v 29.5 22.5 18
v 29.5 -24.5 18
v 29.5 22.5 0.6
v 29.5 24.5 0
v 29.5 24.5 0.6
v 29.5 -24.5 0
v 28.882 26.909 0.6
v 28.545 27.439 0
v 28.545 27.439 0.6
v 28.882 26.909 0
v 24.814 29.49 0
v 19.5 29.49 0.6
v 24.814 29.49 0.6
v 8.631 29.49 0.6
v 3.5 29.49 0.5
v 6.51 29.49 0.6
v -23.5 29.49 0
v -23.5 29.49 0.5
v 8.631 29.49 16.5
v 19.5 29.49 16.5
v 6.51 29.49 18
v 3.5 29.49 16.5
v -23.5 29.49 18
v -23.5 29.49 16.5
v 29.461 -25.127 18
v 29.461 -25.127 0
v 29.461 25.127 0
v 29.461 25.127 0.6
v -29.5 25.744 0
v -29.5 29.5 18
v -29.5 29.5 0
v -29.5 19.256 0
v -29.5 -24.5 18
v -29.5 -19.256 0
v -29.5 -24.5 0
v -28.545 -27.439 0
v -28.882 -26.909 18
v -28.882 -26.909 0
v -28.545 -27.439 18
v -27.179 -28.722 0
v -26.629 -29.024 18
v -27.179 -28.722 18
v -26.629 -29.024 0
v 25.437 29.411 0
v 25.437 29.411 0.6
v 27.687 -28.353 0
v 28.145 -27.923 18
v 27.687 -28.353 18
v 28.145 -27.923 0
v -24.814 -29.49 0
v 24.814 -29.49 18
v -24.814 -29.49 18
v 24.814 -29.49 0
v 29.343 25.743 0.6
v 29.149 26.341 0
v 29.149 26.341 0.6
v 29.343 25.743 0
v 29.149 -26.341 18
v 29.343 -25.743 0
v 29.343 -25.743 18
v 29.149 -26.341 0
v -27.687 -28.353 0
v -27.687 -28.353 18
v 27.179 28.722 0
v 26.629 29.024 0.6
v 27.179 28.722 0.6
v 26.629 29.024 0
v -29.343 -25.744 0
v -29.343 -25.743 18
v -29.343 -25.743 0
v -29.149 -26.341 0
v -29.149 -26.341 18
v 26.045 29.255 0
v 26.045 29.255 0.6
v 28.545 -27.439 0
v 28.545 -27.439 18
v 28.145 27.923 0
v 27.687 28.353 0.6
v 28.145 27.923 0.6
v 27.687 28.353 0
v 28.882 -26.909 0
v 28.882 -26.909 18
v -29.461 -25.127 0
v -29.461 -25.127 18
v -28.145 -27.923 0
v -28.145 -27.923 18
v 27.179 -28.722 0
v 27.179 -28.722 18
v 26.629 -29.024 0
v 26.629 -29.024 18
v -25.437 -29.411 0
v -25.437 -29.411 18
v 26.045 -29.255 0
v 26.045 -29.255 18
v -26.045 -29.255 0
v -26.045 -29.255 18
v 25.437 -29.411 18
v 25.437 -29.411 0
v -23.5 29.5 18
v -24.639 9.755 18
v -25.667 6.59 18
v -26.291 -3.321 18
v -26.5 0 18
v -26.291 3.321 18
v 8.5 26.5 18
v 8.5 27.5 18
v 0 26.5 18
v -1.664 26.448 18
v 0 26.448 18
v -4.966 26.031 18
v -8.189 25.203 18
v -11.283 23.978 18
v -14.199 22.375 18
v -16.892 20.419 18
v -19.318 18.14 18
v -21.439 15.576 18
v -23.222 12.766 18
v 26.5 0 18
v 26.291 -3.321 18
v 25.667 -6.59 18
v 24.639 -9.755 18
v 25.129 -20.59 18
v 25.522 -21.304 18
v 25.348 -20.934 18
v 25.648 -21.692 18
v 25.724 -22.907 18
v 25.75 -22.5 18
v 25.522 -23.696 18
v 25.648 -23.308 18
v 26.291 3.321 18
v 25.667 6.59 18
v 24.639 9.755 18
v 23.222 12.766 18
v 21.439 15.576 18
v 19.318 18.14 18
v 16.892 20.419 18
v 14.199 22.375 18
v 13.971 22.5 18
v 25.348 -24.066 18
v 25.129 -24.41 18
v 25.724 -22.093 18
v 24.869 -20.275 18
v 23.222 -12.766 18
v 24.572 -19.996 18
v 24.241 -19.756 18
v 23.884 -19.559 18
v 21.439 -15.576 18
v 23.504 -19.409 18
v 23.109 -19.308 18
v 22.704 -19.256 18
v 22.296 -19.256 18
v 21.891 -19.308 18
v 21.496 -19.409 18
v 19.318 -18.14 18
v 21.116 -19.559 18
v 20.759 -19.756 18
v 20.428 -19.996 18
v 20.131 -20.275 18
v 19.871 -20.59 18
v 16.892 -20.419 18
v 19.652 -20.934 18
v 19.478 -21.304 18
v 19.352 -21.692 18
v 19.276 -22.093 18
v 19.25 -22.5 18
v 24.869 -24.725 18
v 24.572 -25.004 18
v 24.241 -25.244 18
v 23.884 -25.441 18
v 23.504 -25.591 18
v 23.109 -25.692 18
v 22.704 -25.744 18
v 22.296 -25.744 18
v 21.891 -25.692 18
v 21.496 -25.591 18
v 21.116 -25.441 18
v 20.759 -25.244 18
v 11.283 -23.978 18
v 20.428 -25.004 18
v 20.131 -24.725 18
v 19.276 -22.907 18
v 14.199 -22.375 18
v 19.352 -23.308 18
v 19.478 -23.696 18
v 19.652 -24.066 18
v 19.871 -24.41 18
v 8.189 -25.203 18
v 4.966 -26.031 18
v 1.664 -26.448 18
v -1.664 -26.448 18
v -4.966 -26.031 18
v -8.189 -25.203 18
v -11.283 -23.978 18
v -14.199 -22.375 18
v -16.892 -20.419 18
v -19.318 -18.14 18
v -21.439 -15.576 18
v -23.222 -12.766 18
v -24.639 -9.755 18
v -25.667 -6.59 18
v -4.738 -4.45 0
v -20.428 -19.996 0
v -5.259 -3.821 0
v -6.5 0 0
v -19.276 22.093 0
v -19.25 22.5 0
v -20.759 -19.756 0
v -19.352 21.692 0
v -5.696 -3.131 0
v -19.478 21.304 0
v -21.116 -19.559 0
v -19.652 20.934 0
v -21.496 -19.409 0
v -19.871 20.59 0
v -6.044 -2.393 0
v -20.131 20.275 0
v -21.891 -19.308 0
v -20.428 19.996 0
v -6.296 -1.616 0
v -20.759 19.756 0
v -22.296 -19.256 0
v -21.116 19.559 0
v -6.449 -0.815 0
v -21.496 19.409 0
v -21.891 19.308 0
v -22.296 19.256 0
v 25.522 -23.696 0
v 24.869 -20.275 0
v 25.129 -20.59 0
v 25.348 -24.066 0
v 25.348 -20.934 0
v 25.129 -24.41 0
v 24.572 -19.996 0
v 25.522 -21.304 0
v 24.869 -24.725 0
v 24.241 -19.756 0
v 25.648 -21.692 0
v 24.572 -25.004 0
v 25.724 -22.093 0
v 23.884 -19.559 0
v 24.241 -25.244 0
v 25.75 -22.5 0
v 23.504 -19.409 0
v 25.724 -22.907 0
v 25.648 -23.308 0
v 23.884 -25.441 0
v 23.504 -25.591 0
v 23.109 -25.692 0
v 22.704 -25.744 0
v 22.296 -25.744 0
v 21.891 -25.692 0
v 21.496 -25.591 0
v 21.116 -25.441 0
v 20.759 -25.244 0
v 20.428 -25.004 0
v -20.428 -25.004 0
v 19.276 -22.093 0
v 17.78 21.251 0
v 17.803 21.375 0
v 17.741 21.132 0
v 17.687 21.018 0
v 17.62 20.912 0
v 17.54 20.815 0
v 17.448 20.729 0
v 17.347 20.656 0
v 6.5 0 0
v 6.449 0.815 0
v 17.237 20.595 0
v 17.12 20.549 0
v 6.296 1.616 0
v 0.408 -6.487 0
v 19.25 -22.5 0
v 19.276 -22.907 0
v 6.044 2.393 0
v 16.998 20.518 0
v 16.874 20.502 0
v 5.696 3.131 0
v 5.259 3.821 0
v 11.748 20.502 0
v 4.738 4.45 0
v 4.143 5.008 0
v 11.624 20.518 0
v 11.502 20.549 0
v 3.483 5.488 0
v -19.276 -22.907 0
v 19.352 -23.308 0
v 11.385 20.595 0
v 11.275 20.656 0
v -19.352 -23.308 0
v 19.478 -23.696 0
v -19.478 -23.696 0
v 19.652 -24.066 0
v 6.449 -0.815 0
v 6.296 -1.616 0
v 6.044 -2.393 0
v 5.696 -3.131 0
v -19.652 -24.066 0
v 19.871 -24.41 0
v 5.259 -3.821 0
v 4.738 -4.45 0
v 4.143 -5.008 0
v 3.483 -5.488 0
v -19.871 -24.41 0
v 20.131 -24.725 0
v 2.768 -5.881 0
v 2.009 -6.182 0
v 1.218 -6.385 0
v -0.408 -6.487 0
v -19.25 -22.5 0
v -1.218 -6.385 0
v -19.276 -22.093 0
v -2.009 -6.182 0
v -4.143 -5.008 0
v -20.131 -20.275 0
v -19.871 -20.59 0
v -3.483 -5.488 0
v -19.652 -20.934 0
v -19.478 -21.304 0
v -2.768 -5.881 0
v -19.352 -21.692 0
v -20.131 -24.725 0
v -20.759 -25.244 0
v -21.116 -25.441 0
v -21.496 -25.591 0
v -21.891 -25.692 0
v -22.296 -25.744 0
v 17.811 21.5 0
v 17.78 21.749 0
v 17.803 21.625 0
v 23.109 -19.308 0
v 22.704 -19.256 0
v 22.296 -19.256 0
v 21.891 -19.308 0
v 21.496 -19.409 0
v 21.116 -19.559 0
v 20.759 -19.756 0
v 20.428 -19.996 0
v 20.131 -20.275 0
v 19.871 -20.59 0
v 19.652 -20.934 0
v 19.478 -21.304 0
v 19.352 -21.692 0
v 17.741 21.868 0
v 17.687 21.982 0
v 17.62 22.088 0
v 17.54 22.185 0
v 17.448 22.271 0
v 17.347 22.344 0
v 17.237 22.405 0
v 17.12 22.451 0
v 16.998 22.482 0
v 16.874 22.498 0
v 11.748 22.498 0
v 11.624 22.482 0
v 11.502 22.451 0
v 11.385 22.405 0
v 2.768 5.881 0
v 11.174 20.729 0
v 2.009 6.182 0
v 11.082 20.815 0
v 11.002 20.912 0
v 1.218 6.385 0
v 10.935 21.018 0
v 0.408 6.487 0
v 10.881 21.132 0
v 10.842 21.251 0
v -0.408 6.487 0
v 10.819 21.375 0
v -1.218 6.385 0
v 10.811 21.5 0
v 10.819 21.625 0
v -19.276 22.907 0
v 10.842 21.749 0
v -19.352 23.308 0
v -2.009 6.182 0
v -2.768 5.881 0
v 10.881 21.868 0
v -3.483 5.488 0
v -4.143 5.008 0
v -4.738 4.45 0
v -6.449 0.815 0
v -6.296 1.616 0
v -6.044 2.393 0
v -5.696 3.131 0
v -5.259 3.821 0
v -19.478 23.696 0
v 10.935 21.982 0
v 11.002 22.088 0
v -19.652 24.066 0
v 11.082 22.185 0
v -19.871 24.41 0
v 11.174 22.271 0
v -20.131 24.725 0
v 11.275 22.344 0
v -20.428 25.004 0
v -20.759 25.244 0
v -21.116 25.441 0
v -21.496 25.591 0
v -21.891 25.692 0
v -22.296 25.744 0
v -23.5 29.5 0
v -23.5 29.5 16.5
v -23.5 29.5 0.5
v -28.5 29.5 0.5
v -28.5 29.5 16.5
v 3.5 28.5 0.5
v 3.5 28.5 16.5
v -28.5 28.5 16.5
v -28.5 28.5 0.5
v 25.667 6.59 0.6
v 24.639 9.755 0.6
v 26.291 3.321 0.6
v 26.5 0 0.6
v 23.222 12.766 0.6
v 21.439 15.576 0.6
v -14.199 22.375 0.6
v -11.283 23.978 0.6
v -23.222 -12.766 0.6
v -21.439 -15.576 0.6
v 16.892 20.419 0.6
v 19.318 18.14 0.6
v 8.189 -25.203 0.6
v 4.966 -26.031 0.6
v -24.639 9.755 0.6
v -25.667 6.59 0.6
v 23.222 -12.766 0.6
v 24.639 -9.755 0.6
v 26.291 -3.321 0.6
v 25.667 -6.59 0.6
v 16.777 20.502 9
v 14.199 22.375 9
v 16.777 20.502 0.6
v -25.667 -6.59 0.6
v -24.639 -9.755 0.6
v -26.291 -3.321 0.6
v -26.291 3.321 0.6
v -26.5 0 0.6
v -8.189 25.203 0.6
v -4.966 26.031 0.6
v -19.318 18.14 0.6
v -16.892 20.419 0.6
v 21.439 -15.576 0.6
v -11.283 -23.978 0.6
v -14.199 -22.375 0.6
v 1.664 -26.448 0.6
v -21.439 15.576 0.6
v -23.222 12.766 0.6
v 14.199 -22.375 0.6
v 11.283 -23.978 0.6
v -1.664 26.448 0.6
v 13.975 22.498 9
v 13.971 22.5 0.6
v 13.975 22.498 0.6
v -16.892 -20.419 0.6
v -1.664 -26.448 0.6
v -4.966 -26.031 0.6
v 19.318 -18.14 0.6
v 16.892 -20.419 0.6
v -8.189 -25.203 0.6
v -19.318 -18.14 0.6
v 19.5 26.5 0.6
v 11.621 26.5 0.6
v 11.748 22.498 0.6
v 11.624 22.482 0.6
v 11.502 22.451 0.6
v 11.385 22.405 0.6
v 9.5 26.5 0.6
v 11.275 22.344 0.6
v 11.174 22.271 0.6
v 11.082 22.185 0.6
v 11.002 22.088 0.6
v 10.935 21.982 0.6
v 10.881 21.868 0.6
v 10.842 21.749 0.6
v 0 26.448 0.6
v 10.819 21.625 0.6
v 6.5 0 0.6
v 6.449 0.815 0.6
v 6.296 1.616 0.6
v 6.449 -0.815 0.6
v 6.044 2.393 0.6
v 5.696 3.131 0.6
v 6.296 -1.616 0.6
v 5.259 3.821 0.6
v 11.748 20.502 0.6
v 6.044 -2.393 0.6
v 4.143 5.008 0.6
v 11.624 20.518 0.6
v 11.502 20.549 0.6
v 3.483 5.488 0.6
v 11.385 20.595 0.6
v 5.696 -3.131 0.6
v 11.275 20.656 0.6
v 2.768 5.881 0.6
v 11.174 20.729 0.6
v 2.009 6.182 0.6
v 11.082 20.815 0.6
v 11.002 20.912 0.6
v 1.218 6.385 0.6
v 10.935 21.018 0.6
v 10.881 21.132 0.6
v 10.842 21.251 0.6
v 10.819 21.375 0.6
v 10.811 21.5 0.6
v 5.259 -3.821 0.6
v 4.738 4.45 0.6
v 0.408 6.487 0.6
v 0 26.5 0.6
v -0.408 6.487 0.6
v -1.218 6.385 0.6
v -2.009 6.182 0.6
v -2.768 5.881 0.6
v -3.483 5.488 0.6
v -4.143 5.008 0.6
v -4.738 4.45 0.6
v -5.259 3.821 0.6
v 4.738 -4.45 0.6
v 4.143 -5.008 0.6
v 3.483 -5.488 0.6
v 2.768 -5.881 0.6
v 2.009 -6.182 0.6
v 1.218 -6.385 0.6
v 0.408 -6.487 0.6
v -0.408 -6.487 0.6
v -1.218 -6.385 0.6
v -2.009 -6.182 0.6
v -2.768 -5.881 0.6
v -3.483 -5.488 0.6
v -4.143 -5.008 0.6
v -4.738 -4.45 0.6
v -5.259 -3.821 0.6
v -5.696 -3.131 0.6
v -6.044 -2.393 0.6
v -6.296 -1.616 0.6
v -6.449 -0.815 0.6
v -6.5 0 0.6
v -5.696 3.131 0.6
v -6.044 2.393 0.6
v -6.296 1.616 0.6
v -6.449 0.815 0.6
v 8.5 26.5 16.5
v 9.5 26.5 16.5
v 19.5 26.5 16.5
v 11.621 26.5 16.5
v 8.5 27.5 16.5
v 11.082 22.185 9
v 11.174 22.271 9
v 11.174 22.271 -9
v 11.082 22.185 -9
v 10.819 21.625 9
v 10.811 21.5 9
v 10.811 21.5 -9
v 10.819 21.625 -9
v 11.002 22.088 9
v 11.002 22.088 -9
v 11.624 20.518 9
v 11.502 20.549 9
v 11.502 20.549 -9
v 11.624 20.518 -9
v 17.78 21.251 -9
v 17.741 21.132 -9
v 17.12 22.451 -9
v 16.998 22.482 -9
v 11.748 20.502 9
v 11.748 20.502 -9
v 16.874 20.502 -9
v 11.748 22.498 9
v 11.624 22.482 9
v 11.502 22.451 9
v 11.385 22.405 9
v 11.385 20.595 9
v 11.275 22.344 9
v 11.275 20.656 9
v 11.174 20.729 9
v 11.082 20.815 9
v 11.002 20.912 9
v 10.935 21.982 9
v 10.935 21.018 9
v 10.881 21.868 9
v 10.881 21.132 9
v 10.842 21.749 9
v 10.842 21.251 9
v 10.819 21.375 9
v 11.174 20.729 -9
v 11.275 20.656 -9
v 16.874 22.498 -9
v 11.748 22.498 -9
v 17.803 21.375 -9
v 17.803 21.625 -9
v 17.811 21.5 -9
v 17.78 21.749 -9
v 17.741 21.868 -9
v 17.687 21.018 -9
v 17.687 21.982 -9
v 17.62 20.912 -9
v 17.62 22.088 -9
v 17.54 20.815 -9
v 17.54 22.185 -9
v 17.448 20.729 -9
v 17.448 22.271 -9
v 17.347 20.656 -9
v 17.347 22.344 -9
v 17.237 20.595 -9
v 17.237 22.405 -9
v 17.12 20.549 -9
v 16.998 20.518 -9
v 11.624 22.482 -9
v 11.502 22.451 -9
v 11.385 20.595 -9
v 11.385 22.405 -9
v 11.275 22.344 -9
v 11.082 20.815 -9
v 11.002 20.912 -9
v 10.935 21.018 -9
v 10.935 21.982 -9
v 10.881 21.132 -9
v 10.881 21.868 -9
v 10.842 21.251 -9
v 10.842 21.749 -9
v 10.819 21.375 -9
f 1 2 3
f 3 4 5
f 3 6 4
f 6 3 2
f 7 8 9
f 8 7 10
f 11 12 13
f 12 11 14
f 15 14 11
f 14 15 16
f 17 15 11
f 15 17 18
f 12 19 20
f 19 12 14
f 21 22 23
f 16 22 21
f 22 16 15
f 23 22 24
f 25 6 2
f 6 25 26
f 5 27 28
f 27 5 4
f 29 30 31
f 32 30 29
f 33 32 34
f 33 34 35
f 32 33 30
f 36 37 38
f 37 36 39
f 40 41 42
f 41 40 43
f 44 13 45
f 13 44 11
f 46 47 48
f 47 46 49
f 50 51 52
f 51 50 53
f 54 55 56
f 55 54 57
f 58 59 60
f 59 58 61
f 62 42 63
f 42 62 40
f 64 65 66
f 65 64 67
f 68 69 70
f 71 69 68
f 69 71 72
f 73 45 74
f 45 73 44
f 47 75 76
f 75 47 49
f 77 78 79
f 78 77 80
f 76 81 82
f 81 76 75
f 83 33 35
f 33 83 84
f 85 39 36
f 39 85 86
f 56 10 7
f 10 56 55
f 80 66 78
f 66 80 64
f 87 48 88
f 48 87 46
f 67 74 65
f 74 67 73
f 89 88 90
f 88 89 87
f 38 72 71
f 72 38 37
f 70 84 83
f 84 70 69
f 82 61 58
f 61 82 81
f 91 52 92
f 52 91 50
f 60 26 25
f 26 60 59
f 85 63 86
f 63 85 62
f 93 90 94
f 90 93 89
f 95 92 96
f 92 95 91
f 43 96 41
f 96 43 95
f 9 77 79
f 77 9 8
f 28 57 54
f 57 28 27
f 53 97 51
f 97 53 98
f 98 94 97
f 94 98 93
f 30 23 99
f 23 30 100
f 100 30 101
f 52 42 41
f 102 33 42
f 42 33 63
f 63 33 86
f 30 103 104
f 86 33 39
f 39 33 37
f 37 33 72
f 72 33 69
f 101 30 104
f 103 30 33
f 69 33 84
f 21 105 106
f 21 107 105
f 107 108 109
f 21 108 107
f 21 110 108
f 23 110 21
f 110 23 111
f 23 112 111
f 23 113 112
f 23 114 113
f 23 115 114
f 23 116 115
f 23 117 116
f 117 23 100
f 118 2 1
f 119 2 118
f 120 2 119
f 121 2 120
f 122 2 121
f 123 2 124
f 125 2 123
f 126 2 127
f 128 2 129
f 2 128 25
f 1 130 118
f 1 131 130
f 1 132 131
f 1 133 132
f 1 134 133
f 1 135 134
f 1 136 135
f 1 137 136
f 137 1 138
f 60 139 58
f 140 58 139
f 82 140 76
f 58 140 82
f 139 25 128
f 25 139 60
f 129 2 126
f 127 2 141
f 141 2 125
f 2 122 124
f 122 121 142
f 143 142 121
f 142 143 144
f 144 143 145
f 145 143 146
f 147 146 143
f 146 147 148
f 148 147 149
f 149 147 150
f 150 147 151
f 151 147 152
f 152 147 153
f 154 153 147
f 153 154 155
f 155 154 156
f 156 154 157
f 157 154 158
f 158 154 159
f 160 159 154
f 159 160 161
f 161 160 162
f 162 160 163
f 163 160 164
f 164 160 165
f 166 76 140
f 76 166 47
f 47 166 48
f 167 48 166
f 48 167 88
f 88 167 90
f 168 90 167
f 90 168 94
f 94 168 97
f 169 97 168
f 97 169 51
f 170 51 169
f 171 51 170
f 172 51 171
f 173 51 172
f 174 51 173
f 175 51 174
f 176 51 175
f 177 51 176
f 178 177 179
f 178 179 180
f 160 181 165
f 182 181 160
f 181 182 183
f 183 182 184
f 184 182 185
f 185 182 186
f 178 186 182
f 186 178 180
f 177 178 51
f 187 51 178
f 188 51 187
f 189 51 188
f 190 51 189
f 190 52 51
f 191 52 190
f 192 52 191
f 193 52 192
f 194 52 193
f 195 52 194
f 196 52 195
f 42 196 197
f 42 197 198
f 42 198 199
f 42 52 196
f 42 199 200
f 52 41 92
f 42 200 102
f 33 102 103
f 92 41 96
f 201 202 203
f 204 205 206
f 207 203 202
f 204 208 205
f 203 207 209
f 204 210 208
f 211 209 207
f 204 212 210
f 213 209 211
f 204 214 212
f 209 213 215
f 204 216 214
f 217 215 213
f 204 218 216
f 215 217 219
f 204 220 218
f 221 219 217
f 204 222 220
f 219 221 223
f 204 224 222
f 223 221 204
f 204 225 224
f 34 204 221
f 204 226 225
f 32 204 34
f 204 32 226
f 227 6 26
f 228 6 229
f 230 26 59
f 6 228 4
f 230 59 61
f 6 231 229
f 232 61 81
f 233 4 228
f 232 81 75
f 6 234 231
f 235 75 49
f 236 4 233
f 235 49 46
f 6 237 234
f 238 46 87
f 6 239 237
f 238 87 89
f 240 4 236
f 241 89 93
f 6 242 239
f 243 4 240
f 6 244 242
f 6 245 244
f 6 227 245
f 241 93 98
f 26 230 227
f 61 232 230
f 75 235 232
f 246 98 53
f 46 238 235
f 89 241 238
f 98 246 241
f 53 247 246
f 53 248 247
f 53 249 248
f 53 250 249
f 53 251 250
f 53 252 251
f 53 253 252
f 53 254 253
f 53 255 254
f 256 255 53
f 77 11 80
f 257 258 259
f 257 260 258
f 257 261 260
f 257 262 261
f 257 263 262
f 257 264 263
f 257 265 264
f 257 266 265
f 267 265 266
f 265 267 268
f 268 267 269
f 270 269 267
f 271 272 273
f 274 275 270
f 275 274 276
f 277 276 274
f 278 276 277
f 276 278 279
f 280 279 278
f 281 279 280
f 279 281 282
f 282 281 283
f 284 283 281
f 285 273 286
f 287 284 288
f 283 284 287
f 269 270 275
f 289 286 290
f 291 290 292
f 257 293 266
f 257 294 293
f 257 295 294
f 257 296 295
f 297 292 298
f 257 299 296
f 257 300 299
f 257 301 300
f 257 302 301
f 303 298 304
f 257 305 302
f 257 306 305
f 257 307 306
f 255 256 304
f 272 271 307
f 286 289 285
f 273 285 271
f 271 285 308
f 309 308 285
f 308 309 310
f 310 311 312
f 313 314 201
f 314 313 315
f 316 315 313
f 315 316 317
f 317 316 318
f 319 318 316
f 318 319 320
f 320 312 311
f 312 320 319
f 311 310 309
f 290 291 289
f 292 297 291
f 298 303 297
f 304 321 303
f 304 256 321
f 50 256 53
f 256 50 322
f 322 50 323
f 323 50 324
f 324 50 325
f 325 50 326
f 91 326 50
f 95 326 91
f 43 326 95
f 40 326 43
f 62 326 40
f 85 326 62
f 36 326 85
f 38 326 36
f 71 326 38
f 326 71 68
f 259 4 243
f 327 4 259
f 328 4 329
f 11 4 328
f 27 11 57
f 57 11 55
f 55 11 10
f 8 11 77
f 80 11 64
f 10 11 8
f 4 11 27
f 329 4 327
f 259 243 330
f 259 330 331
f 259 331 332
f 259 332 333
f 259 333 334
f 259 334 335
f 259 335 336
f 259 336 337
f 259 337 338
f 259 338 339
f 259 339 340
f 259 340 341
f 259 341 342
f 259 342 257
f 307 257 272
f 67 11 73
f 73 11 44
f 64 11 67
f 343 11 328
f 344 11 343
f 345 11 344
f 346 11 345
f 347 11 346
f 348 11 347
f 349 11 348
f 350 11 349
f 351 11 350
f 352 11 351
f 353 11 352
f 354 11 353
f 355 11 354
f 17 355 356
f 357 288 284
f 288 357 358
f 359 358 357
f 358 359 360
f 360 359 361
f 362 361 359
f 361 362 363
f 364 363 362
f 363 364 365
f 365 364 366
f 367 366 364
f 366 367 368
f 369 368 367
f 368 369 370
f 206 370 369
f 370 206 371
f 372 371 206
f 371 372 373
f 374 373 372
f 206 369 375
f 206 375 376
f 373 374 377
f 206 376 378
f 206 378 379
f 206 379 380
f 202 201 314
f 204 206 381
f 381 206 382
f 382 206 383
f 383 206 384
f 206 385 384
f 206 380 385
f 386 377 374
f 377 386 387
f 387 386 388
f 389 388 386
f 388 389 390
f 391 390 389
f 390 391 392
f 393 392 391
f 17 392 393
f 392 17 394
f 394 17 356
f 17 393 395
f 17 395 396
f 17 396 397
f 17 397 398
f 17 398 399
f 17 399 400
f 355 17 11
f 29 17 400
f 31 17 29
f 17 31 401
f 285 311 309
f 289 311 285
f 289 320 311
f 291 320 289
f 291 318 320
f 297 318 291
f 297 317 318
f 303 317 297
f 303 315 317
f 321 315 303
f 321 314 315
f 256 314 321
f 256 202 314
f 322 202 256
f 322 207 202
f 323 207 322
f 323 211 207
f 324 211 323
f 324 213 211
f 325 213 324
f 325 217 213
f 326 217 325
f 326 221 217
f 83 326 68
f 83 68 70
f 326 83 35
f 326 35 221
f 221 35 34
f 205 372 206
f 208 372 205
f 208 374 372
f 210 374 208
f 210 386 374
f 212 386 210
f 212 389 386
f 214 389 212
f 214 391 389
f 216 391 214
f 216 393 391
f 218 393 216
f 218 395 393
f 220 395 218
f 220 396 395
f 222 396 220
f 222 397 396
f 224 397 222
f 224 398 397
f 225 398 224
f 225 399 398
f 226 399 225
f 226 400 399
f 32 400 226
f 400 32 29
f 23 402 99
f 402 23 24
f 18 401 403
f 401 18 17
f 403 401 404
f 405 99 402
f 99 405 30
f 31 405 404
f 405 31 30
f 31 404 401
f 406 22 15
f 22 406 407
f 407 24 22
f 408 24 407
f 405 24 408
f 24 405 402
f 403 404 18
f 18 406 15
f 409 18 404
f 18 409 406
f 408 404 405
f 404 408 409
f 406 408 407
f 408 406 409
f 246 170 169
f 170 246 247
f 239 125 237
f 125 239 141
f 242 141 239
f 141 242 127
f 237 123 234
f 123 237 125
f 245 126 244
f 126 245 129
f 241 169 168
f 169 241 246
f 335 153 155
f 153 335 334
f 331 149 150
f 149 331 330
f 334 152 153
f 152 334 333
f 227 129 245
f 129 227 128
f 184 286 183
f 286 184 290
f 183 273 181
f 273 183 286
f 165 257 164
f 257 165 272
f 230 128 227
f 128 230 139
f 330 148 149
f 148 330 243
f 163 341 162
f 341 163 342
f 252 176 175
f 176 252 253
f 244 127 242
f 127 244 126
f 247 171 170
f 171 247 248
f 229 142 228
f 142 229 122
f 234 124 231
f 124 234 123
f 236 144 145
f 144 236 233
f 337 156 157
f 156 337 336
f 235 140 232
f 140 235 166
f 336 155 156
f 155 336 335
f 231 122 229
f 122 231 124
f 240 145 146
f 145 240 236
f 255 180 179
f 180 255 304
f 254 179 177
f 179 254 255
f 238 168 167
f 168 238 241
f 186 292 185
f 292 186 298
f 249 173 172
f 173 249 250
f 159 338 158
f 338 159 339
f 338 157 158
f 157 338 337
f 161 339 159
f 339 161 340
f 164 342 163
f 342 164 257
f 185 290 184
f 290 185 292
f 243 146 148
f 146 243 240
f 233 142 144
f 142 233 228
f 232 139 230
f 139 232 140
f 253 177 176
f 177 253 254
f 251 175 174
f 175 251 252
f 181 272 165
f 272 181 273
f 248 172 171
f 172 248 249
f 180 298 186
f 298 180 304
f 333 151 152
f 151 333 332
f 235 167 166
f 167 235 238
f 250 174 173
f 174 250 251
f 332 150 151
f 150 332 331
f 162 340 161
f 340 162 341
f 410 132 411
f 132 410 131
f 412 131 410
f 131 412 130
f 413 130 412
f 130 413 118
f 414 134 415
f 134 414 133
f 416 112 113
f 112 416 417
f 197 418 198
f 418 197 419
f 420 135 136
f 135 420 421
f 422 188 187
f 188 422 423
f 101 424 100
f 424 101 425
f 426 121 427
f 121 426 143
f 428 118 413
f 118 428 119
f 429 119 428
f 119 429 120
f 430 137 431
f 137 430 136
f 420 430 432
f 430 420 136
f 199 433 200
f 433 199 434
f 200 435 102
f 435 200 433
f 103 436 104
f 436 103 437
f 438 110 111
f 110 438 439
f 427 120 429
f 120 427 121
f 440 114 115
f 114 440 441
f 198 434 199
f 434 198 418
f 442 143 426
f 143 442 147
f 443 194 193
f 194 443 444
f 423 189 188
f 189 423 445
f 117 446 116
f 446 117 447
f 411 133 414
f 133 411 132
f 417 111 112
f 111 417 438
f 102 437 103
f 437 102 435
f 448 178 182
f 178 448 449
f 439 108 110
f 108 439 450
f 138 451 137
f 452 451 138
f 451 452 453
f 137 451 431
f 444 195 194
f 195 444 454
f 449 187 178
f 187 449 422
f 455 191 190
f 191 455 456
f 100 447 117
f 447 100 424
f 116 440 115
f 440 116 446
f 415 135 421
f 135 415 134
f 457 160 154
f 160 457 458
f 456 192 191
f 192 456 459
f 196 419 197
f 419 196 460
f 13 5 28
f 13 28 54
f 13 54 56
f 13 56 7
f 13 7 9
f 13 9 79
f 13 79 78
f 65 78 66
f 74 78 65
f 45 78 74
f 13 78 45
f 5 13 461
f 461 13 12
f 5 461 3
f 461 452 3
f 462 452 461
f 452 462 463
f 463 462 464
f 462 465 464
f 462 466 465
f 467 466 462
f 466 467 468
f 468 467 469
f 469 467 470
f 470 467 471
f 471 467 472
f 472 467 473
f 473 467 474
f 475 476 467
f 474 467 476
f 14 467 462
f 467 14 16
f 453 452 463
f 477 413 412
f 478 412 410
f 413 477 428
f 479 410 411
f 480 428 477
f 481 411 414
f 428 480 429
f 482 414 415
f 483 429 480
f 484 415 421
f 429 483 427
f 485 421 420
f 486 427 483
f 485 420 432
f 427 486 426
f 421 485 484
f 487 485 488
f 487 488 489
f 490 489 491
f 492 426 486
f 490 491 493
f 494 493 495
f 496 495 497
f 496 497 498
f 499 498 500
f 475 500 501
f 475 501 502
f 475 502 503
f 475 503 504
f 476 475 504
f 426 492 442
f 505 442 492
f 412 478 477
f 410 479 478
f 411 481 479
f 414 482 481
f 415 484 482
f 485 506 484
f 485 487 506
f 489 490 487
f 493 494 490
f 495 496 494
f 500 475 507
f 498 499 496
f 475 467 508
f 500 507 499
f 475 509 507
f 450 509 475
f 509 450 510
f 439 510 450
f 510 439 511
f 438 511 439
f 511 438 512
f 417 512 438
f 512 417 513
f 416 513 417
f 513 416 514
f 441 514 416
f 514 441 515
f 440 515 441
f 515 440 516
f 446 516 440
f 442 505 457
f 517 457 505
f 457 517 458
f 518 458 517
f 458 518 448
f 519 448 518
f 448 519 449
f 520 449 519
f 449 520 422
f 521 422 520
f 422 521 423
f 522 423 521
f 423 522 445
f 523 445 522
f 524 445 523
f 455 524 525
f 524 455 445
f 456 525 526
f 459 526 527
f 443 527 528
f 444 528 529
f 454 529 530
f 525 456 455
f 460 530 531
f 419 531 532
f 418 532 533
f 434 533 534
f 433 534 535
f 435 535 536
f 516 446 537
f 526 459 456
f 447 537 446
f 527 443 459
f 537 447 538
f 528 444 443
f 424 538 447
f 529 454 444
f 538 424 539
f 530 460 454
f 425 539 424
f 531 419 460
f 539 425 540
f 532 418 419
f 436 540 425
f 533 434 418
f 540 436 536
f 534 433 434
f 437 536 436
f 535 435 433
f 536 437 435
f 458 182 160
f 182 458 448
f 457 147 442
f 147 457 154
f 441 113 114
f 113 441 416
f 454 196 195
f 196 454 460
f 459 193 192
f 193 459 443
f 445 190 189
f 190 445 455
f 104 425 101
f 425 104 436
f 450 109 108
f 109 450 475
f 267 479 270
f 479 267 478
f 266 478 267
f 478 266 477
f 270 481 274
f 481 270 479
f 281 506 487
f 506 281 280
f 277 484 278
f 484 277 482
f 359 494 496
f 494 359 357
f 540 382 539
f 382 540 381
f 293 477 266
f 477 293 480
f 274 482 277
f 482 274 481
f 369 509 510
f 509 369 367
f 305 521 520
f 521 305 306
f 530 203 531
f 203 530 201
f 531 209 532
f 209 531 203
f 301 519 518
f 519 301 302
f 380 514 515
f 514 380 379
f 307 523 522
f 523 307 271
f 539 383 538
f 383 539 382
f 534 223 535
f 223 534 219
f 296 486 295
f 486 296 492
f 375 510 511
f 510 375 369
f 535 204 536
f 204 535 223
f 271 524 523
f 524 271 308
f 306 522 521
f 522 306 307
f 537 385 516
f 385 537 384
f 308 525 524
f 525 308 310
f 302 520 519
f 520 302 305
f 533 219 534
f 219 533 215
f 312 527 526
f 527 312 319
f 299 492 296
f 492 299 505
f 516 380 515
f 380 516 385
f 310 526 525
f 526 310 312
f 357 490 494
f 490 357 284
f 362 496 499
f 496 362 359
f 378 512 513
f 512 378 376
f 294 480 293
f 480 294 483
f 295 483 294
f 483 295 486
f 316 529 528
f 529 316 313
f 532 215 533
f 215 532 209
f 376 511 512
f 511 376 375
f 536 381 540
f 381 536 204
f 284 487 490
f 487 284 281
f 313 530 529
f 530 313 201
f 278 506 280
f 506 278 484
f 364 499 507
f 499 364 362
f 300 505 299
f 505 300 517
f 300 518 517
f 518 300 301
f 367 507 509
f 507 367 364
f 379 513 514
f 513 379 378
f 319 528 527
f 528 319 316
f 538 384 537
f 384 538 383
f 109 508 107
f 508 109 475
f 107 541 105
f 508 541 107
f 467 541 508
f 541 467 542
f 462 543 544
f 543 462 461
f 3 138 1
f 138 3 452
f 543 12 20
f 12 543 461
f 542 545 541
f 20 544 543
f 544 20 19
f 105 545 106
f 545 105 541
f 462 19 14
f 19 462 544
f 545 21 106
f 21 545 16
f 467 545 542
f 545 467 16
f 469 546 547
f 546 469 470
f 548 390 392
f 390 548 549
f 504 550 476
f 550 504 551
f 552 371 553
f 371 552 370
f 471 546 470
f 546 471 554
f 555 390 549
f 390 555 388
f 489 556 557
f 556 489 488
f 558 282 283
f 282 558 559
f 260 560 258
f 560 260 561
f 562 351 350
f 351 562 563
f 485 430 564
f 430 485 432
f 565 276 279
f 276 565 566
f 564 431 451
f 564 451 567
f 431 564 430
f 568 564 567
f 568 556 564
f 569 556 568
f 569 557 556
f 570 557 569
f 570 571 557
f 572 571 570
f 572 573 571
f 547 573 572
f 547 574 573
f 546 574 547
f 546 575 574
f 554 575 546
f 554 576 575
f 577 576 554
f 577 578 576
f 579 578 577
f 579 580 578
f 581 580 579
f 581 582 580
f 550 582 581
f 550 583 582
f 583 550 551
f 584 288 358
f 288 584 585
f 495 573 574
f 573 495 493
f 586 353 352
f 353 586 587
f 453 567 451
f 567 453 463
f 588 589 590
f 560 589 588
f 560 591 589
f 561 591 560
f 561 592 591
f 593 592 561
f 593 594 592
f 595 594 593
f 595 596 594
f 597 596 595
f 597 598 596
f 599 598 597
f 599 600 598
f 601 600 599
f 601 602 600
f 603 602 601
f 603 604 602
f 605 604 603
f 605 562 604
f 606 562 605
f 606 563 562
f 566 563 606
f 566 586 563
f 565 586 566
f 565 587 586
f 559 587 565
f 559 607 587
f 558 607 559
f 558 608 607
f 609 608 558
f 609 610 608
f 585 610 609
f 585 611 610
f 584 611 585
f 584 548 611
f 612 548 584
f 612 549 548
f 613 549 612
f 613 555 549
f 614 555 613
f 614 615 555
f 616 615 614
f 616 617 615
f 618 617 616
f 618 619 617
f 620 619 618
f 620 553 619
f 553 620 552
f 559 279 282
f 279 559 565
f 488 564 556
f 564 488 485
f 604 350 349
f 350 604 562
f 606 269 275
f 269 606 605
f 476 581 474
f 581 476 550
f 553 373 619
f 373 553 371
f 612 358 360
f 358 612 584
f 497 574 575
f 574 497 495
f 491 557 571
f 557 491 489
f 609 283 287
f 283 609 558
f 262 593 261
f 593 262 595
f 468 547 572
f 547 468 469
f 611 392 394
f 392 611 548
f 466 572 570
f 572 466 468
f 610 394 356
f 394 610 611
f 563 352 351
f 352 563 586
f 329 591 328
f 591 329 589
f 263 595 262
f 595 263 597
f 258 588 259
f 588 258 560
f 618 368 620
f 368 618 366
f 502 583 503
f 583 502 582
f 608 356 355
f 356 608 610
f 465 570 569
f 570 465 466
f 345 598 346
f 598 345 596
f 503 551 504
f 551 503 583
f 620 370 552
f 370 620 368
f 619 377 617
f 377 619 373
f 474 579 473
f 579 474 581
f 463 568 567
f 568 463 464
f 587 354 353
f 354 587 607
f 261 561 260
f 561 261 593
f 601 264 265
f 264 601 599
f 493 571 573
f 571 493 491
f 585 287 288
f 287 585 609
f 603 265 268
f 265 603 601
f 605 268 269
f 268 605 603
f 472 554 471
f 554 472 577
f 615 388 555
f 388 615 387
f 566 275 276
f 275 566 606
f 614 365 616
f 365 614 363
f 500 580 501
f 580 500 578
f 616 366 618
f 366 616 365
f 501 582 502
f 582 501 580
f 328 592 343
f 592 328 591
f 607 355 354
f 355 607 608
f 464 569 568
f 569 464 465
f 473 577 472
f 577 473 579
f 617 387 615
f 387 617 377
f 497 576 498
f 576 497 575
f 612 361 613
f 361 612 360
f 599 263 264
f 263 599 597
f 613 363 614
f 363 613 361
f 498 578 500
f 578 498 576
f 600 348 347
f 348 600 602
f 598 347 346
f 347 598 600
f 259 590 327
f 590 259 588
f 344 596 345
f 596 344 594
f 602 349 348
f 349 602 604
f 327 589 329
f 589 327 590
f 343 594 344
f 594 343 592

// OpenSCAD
$fn = 50;


union() {
	difference() {
		union() {
			hull() {
				translate(v = [-24.5000000000, 24.5000000000, 0]) {
					cylinder(h = 18, r = 5);
				}
				translate(v = [24.5000000000, 24.5000000000, 0]) {
					cylinder(h = 18, r = 5);
				}
				translate(v = [-24.5000000000, -24.5000000000, 0]) {
					cylinder(h = 18, r = 5);
				}
				translate(v = [24.5000000000, -24.5000000000, 0]) {
					cylinder(h = 18, r = 5);
				}
			}
			translate(v = [-29.5000000000, 23.5000000000, 0]) {
				cube(size = [6, 6, 18]);
			}
		}
		union() {
			translate(v = [-30.0000000000, -22.5000000000, -250.0000000000]) {
				rotate(a = [0, 0, 0]) {
					difference() {
						union() {
							hull() {
								translate(v = [7.5000000000, 0, 0]) {
									cylinder(h = 250, r = 3.2500000000, r1 = 3.2500000000, r2 = 3.2500000000);
								}
								translate(v = [-7.5000000000, 0, 0]) {
									cylinder(h = 250, r = 3.2500000000, r1 = 3.2500000000, r2 = 3.2500000000);
								}
							}
						}
						union();
					}
				}
			}
			translate(v = [-30.0000000000, 22.5000000000, -250.0000000000]) {
				rotate(a = [0, 0, 0]) {
					difference() {
						union() {
							hull() {
								translate(v = [7.5000000000, 0, 0]) {
									cylinder(h = 250, r = 3.2500000000, r1 = 3.2500000000, r2 = 3.2500000000);
								}
								translate(v = [-7.5000000000, 0, 0]) {
									cylinder(h = 250, r = 3.2500000000, r1 = 3.2500000000, r2 = 3.2500000000);
								}
							}
						}
						union();
					}
				}
			}
			translate(v = [-28.5000000000, 28.5000000000, 0.5000000000]) {
				cube(size = [32, 1, 16]);
			}
			translate(v = [22.5000000000, -22.5000000000, 0]) {
				cylinder(h = 100, r = 3.2500000000);
			}
			translate(v = [0, 0, 0.6000000000]) {
				cylinder(h = 20.4000000000, r = 26.5000000000);
			}
			translate(v = [0, 0, -9.0000000000]) {
				cylinder(h = 18, r = 6.5000000000);
			}
			translate(v = [0.0000000000, 22.5000000000, 0.6000000000]) {
				cube(size = [29.5000000000, 4, 20.4000000000]);
			}
			translate(v = [19.5000000000, 22.5000000000, 0.6000000000]) {
				cube(size = [10, 7, 20.4000000000]);
			}
			translate(v = [8.5000000000, 22.5000000000, 16.5000000000]) {
				cube(size = [21, 7, 1.5000000000]);
			}
			translate(v = [5.7500000000, 30.2500000000, 0.6000000000]) {
				rotate(a = [0, 0, -45]) {
					cube(size = [7.5000000000, 1.5000000000, 20.4000000000]);
				}
			}
			translate(v = [5.0610000000, 20.5000000000, 0.6000000000]) {
				cube(size = [7.5000000000, 2, 17.4000000000]);
			}
		}
	}
	union() {
		translate(v = [14.3110000000, 21.5000000000, -9.0000000000]) {
			rotate(a = [0, 0, 0]) {
				difference() {
					union() {
						#hull() {
							#translate(v = [2.5000000000, 0, 0]) {
								cylinder(h = 18, r = 1.0000000000, r1 = 1.0000000000, r2 = 1.0000000000);
							}
							#translate(v = [-2.5000000000, 0, 0]) {
								cylinder(h = 18, r = 1.0000000000, r1 = 1.0000000000, r2 = 1.0000000000);
							}
						}
					}
					union();
				}
			}
		}
	}
}
